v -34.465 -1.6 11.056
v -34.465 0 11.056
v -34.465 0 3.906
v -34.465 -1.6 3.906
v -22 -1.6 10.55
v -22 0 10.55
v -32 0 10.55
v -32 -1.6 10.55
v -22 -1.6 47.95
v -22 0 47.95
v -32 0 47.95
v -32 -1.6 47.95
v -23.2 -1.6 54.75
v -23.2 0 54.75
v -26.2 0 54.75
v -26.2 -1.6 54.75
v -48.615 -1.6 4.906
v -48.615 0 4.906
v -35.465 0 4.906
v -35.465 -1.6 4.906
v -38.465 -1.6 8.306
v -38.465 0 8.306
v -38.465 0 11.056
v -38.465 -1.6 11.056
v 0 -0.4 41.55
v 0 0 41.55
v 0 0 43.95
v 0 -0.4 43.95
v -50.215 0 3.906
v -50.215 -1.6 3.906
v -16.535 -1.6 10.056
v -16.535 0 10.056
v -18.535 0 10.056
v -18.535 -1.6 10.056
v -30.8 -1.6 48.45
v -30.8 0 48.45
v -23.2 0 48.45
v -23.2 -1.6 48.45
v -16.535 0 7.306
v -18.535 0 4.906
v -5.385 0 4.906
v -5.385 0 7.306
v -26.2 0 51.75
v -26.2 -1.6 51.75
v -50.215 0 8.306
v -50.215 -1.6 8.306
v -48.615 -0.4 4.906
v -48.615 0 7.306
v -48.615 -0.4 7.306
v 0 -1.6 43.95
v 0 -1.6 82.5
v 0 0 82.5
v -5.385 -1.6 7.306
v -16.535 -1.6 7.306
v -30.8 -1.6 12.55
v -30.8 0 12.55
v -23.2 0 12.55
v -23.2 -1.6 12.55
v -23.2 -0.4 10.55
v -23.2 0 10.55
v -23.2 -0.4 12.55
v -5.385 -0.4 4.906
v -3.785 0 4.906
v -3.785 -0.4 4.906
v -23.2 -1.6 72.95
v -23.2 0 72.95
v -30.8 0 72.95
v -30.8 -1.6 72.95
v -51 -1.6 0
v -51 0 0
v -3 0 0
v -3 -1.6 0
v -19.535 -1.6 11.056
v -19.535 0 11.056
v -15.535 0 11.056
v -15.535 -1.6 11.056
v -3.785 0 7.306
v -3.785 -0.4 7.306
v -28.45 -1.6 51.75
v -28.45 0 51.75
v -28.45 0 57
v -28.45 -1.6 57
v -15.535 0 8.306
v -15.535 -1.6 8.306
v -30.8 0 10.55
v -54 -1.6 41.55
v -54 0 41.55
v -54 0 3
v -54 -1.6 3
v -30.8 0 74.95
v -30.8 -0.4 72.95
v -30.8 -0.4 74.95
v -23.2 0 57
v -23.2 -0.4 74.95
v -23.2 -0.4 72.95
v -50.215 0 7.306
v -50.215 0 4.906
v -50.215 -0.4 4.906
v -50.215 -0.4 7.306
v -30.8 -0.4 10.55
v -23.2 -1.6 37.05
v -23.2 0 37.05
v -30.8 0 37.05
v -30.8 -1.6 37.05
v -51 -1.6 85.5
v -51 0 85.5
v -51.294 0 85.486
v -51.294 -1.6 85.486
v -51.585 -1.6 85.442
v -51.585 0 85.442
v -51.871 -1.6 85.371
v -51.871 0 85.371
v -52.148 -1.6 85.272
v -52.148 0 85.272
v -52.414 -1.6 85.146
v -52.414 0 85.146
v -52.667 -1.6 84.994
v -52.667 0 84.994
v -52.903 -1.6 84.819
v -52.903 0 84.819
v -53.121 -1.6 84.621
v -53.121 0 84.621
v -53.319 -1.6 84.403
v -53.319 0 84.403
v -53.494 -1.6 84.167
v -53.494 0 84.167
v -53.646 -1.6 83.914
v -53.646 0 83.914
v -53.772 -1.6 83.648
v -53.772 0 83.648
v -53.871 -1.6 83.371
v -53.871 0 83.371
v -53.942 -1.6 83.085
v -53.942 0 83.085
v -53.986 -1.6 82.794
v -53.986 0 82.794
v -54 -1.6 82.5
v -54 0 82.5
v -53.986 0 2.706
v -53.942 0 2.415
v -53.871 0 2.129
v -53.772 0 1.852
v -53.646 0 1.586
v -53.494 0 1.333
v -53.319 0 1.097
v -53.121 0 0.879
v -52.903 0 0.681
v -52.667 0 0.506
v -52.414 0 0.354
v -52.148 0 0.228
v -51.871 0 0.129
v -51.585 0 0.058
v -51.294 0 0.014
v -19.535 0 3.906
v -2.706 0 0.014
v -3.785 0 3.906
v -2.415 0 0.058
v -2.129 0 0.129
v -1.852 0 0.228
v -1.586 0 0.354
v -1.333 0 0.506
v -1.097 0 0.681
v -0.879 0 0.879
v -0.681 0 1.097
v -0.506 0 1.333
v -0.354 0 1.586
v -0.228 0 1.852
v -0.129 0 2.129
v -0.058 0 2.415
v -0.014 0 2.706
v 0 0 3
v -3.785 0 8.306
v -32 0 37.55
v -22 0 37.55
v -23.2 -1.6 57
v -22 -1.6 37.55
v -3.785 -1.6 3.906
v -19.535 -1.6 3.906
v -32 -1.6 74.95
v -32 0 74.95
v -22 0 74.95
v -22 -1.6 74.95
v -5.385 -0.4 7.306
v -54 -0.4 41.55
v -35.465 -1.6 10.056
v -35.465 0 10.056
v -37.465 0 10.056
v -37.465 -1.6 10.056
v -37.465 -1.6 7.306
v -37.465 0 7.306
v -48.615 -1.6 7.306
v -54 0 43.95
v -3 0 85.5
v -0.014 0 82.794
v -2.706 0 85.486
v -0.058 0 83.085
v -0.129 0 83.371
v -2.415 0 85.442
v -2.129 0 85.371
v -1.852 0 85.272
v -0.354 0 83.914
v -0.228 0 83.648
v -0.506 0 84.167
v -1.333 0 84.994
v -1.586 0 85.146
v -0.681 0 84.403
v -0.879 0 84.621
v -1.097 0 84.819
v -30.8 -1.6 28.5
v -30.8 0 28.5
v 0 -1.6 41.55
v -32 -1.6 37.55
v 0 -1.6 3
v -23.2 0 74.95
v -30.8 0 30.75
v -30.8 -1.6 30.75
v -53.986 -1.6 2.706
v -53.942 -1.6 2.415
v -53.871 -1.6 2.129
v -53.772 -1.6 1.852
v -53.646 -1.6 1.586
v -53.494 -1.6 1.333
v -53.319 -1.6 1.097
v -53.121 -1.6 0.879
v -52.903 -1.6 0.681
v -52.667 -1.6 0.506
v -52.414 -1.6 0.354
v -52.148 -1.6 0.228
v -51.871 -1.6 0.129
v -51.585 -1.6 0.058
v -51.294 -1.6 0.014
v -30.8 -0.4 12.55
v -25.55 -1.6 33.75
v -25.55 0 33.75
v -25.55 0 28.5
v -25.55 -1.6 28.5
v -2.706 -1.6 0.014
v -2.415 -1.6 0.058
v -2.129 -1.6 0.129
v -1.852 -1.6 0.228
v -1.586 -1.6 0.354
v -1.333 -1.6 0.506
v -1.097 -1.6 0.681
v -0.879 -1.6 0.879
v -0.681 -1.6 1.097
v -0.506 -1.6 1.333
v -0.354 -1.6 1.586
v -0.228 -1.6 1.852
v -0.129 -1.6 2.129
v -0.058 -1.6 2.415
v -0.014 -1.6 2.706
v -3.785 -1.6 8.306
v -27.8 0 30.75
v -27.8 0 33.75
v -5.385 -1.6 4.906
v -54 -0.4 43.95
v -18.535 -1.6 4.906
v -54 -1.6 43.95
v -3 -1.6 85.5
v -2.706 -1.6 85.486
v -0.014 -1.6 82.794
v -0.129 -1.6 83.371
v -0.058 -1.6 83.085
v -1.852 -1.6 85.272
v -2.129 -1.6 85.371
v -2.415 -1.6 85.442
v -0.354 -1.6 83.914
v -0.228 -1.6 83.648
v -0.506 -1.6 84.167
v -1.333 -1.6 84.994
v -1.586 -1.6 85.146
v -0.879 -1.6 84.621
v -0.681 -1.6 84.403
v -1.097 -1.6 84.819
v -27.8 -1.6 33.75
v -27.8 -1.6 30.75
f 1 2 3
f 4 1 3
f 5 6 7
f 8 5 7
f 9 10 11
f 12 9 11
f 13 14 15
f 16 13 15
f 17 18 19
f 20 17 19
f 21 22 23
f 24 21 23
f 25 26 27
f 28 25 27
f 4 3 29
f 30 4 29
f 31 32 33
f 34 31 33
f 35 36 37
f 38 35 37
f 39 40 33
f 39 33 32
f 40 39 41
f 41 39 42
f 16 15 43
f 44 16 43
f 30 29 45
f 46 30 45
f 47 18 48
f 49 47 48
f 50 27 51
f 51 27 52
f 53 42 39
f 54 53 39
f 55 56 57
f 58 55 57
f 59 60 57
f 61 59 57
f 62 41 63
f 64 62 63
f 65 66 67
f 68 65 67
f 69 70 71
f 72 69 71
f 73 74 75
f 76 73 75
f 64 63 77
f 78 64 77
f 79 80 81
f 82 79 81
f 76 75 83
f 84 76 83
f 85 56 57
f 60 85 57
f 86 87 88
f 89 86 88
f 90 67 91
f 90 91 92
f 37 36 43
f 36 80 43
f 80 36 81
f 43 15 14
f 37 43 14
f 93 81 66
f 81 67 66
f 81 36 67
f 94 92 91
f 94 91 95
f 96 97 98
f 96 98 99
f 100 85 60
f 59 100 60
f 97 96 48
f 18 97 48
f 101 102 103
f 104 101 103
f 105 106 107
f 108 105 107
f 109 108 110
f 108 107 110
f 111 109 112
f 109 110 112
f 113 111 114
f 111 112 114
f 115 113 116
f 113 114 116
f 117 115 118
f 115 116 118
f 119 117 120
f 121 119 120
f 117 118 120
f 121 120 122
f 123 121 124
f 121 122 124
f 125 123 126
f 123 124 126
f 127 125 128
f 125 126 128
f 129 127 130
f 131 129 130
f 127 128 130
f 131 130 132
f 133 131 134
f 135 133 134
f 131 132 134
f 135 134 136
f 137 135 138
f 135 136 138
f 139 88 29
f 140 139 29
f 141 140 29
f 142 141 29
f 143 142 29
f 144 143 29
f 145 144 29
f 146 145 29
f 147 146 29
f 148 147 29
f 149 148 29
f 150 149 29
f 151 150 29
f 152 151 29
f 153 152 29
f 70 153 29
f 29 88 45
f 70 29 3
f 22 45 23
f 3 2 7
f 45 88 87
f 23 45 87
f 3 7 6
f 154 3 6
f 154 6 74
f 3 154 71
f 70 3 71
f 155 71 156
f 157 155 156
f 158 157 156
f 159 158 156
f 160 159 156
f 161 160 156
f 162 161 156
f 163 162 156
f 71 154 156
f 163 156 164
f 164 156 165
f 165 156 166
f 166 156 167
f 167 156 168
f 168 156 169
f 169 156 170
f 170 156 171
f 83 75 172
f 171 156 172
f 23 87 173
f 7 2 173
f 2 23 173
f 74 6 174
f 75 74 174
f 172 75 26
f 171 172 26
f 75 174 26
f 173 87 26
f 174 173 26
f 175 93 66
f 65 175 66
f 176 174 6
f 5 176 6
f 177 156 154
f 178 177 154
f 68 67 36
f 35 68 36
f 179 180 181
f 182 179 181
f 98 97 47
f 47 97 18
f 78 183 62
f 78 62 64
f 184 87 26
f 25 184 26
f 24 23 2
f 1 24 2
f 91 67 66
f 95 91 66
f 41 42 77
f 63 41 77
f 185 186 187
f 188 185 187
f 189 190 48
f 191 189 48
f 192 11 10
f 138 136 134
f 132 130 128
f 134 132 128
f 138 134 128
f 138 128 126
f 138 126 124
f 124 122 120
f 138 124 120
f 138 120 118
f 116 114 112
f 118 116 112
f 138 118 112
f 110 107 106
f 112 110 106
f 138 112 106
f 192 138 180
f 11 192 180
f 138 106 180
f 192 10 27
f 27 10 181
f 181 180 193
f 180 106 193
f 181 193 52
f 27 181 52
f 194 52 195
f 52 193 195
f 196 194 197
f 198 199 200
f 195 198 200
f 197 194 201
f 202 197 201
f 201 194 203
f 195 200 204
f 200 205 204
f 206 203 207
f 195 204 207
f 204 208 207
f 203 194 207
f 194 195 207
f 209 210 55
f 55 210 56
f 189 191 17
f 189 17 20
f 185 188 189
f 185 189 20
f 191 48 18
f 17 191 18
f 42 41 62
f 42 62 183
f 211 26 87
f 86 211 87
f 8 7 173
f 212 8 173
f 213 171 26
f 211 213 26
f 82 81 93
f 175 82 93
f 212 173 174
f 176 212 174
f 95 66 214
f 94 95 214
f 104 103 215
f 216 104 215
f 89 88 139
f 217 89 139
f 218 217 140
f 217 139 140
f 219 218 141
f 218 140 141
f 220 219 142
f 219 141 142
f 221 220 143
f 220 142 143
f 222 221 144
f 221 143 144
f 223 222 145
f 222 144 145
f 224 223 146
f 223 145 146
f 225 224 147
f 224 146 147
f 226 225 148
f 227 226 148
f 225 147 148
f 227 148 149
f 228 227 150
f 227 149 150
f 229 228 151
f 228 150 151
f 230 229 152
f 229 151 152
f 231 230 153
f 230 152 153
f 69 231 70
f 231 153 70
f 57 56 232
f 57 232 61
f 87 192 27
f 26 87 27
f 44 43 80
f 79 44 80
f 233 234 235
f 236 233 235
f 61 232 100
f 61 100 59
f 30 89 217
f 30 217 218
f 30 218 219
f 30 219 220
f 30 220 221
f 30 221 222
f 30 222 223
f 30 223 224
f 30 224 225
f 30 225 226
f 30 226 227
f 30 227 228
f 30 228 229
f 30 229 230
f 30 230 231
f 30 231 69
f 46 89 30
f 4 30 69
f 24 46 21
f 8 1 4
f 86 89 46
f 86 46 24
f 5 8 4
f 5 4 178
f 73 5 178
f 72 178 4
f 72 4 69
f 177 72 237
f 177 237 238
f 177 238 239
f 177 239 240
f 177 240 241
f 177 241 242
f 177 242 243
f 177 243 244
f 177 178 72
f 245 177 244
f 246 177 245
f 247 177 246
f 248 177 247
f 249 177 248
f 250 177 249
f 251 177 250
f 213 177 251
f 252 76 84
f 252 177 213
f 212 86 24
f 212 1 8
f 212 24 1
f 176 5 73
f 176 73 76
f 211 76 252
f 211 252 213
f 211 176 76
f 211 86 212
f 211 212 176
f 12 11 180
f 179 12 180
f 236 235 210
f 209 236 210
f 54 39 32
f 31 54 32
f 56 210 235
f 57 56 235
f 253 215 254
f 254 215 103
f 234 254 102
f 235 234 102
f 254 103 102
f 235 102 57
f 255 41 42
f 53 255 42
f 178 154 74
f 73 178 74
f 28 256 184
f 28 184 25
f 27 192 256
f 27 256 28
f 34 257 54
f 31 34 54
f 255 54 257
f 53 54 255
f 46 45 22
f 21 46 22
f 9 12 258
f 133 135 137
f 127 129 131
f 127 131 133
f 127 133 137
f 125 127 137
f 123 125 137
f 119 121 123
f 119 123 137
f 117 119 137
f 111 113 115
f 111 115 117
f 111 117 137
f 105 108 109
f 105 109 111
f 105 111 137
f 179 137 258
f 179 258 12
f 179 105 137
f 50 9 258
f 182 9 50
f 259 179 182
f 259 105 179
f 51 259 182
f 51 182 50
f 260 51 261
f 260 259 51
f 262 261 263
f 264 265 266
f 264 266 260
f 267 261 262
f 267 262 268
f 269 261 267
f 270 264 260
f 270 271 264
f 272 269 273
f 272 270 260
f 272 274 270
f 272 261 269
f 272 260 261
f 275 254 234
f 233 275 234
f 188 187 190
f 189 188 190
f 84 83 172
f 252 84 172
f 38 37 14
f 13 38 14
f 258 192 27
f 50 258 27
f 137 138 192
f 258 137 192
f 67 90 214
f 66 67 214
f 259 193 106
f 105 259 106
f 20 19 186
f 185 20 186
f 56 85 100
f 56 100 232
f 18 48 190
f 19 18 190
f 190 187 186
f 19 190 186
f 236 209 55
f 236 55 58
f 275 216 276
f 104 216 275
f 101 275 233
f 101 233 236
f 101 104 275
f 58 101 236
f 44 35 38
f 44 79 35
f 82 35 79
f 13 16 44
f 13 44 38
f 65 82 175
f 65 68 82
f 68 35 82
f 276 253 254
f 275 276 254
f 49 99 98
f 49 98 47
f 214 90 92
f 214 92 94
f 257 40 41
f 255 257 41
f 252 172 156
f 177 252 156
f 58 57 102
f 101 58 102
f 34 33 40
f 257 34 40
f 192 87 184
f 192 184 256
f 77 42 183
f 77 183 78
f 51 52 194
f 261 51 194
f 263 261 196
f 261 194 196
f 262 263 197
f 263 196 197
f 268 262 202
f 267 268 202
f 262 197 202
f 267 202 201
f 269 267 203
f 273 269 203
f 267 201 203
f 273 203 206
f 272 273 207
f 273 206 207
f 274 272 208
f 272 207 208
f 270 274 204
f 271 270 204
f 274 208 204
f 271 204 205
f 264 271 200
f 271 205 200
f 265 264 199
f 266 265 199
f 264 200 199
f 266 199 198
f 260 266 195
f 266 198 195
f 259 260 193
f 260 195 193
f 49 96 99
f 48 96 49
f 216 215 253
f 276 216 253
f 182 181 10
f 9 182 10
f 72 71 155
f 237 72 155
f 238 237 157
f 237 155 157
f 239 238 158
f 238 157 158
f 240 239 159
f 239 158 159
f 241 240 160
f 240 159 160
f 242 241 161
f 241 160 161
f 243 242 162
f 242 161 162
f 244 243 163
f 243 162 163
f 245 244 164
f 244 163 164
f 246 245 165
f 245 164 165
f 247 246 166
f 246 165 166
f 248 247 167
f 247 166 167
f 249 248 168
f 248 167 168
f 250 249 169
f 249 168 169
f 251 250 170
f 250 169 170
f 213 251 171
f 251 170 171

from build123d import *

# Parameters (mm, degrees)
F0_W     = 54
F0_H     = 2.4
F0_W_2   = 7.6
F0_H_2   = 2
F0_W_3   = 1.6
F1_DEPTH = 0.4
F2_DEPTH = 1.6


with BuildPart() as f1:
    # F0 (on Front) → F1 (new body)
    with BuildSketch(Plane.XZ):
        with Locations((-27, 42.75)):
            Rectangle(F0_W, F0_H)
        with Locations((-27, 73.95)):
            Rectangle(F0_W_2, F0_H_2)
        with Locations((-27, 11.55)):
            Rectangle(F0_W_2, F0_H_2)
        with Locations((-4.585127, 6.106142)):
            Rectangle(F0_W_3, F0_H)
        with Locations((-49.414873, 6.106142)):
            Rectangle(F0_W_3, F0_H)
    extrude(amount=F1_DEPTH)


with BuildPart() as f2:
    # F0 (on Front) → F2 (new body)
    with BuildSketch(Plane.XZ):
        with BuildLine():
            Line((-54, 43.95), (0, 43.95))
            Line((0, 43.95), (0, 82.5))
            ThreePointArc((0, 82.5), (-0.87868, 84.62132), (-3, 85.5))
            Line((-3, 85.5), (-51, 85.5))
            ThreePointArc((-51, 85.5), (-53.12132, 84.62132), (-54, 82.5))
            Line((-54, 82.5), (-54, 43.95))
        make_face()
        Polygon((-32, 47.95), (-32, 74.95), (-30.8, 74.95), (-23.2, 74.95), (-22, 74.95), (-22, 47.95), align=None, mode=Mode.SUBTRACT)
        Polygon((-23.2, 72.95), (-30.8, 72.95), (-30.8, 48.45), (-23.2, 48.45), (-23.2, 54.75), (-26.2, 54.75), (-26.2, 51.75), (-28.45, 51.75), (-28.45, 57), (-23.2, 57), align=None)
        with BuildLine():
            Line((-51, 0), (-3, 0))
            ThreePointArc((-3, 0), (-0.87868, 0.87868), (0, 3))
            Line((0, 3), (0, 41.55))
            Line((0, 41.55), (-54, 41.55))
            Line((-54, 41.55), (-54, 3))
            ThreePointArc((-54, 3), (-53.12132, 0.87868), (-51, 0))
        make_face()
        Polygon((-50.214873, 7.306142), (-50.214873, 8.306142), (-48.614873, 8.306142), (-38.464873, 8.306142), (-38.464873, 11.056142), (-34.464873, 11.056142), (-34.464873, 3.906142), (-50.214873, 3.906142), (-50.214873, 4.906142), align=None, mode=Mode.SUBTRACT)
        Polygon((-15.535127, 11.056142), (-15.535127, 8.306142), (-5.385127, 8.306142), (-3.785127, 8.306142), (-3.785127, 7.306142), (-3.785127, 4.906142), (-3.785127, 3.906142), (-19.535127, 3.906142), (-19.535127, 11.056142), align=None, mode=Mode.SUBTRACT)
        Polygon((-32, 10.55), (-32, 37.55), (-22, 37.55), (-22, 10.55), (-23.2, 10.55), (-30.8, 10.55), align=None, mode=Mode.SUBTRACT)
        Polygon((-30.8, 28.5), (-30.8, 12.55), (-23.2, 12.55), (-23.2, 37.05), (-30.8, 37.05), (-30.8, 30.75), (-27.8, 30.75), (-27.8, 33.75), (-25.55, 33.75), (-25.55, 28.5), align=None)
        Polygon((-37.464873, 7.306142), (-48.614873, 7.306142), (-48.614873, 4.906142), (-35.464873, 4.906142), (-35.464873, 10.056142), (-37.464873, 10.056142), align=None)
        Polygon((-5.385127, 4.906142), (-5.385127, 7.306142), (-16.535127, 7.306142), (-16.535127, 10.056142), (-18.535127, 10.056142), (-18.535127, 4.906142), align=None)
    extrude(amount=F2_DEPTH)


solid = Compound([f1.part, f2.part])
